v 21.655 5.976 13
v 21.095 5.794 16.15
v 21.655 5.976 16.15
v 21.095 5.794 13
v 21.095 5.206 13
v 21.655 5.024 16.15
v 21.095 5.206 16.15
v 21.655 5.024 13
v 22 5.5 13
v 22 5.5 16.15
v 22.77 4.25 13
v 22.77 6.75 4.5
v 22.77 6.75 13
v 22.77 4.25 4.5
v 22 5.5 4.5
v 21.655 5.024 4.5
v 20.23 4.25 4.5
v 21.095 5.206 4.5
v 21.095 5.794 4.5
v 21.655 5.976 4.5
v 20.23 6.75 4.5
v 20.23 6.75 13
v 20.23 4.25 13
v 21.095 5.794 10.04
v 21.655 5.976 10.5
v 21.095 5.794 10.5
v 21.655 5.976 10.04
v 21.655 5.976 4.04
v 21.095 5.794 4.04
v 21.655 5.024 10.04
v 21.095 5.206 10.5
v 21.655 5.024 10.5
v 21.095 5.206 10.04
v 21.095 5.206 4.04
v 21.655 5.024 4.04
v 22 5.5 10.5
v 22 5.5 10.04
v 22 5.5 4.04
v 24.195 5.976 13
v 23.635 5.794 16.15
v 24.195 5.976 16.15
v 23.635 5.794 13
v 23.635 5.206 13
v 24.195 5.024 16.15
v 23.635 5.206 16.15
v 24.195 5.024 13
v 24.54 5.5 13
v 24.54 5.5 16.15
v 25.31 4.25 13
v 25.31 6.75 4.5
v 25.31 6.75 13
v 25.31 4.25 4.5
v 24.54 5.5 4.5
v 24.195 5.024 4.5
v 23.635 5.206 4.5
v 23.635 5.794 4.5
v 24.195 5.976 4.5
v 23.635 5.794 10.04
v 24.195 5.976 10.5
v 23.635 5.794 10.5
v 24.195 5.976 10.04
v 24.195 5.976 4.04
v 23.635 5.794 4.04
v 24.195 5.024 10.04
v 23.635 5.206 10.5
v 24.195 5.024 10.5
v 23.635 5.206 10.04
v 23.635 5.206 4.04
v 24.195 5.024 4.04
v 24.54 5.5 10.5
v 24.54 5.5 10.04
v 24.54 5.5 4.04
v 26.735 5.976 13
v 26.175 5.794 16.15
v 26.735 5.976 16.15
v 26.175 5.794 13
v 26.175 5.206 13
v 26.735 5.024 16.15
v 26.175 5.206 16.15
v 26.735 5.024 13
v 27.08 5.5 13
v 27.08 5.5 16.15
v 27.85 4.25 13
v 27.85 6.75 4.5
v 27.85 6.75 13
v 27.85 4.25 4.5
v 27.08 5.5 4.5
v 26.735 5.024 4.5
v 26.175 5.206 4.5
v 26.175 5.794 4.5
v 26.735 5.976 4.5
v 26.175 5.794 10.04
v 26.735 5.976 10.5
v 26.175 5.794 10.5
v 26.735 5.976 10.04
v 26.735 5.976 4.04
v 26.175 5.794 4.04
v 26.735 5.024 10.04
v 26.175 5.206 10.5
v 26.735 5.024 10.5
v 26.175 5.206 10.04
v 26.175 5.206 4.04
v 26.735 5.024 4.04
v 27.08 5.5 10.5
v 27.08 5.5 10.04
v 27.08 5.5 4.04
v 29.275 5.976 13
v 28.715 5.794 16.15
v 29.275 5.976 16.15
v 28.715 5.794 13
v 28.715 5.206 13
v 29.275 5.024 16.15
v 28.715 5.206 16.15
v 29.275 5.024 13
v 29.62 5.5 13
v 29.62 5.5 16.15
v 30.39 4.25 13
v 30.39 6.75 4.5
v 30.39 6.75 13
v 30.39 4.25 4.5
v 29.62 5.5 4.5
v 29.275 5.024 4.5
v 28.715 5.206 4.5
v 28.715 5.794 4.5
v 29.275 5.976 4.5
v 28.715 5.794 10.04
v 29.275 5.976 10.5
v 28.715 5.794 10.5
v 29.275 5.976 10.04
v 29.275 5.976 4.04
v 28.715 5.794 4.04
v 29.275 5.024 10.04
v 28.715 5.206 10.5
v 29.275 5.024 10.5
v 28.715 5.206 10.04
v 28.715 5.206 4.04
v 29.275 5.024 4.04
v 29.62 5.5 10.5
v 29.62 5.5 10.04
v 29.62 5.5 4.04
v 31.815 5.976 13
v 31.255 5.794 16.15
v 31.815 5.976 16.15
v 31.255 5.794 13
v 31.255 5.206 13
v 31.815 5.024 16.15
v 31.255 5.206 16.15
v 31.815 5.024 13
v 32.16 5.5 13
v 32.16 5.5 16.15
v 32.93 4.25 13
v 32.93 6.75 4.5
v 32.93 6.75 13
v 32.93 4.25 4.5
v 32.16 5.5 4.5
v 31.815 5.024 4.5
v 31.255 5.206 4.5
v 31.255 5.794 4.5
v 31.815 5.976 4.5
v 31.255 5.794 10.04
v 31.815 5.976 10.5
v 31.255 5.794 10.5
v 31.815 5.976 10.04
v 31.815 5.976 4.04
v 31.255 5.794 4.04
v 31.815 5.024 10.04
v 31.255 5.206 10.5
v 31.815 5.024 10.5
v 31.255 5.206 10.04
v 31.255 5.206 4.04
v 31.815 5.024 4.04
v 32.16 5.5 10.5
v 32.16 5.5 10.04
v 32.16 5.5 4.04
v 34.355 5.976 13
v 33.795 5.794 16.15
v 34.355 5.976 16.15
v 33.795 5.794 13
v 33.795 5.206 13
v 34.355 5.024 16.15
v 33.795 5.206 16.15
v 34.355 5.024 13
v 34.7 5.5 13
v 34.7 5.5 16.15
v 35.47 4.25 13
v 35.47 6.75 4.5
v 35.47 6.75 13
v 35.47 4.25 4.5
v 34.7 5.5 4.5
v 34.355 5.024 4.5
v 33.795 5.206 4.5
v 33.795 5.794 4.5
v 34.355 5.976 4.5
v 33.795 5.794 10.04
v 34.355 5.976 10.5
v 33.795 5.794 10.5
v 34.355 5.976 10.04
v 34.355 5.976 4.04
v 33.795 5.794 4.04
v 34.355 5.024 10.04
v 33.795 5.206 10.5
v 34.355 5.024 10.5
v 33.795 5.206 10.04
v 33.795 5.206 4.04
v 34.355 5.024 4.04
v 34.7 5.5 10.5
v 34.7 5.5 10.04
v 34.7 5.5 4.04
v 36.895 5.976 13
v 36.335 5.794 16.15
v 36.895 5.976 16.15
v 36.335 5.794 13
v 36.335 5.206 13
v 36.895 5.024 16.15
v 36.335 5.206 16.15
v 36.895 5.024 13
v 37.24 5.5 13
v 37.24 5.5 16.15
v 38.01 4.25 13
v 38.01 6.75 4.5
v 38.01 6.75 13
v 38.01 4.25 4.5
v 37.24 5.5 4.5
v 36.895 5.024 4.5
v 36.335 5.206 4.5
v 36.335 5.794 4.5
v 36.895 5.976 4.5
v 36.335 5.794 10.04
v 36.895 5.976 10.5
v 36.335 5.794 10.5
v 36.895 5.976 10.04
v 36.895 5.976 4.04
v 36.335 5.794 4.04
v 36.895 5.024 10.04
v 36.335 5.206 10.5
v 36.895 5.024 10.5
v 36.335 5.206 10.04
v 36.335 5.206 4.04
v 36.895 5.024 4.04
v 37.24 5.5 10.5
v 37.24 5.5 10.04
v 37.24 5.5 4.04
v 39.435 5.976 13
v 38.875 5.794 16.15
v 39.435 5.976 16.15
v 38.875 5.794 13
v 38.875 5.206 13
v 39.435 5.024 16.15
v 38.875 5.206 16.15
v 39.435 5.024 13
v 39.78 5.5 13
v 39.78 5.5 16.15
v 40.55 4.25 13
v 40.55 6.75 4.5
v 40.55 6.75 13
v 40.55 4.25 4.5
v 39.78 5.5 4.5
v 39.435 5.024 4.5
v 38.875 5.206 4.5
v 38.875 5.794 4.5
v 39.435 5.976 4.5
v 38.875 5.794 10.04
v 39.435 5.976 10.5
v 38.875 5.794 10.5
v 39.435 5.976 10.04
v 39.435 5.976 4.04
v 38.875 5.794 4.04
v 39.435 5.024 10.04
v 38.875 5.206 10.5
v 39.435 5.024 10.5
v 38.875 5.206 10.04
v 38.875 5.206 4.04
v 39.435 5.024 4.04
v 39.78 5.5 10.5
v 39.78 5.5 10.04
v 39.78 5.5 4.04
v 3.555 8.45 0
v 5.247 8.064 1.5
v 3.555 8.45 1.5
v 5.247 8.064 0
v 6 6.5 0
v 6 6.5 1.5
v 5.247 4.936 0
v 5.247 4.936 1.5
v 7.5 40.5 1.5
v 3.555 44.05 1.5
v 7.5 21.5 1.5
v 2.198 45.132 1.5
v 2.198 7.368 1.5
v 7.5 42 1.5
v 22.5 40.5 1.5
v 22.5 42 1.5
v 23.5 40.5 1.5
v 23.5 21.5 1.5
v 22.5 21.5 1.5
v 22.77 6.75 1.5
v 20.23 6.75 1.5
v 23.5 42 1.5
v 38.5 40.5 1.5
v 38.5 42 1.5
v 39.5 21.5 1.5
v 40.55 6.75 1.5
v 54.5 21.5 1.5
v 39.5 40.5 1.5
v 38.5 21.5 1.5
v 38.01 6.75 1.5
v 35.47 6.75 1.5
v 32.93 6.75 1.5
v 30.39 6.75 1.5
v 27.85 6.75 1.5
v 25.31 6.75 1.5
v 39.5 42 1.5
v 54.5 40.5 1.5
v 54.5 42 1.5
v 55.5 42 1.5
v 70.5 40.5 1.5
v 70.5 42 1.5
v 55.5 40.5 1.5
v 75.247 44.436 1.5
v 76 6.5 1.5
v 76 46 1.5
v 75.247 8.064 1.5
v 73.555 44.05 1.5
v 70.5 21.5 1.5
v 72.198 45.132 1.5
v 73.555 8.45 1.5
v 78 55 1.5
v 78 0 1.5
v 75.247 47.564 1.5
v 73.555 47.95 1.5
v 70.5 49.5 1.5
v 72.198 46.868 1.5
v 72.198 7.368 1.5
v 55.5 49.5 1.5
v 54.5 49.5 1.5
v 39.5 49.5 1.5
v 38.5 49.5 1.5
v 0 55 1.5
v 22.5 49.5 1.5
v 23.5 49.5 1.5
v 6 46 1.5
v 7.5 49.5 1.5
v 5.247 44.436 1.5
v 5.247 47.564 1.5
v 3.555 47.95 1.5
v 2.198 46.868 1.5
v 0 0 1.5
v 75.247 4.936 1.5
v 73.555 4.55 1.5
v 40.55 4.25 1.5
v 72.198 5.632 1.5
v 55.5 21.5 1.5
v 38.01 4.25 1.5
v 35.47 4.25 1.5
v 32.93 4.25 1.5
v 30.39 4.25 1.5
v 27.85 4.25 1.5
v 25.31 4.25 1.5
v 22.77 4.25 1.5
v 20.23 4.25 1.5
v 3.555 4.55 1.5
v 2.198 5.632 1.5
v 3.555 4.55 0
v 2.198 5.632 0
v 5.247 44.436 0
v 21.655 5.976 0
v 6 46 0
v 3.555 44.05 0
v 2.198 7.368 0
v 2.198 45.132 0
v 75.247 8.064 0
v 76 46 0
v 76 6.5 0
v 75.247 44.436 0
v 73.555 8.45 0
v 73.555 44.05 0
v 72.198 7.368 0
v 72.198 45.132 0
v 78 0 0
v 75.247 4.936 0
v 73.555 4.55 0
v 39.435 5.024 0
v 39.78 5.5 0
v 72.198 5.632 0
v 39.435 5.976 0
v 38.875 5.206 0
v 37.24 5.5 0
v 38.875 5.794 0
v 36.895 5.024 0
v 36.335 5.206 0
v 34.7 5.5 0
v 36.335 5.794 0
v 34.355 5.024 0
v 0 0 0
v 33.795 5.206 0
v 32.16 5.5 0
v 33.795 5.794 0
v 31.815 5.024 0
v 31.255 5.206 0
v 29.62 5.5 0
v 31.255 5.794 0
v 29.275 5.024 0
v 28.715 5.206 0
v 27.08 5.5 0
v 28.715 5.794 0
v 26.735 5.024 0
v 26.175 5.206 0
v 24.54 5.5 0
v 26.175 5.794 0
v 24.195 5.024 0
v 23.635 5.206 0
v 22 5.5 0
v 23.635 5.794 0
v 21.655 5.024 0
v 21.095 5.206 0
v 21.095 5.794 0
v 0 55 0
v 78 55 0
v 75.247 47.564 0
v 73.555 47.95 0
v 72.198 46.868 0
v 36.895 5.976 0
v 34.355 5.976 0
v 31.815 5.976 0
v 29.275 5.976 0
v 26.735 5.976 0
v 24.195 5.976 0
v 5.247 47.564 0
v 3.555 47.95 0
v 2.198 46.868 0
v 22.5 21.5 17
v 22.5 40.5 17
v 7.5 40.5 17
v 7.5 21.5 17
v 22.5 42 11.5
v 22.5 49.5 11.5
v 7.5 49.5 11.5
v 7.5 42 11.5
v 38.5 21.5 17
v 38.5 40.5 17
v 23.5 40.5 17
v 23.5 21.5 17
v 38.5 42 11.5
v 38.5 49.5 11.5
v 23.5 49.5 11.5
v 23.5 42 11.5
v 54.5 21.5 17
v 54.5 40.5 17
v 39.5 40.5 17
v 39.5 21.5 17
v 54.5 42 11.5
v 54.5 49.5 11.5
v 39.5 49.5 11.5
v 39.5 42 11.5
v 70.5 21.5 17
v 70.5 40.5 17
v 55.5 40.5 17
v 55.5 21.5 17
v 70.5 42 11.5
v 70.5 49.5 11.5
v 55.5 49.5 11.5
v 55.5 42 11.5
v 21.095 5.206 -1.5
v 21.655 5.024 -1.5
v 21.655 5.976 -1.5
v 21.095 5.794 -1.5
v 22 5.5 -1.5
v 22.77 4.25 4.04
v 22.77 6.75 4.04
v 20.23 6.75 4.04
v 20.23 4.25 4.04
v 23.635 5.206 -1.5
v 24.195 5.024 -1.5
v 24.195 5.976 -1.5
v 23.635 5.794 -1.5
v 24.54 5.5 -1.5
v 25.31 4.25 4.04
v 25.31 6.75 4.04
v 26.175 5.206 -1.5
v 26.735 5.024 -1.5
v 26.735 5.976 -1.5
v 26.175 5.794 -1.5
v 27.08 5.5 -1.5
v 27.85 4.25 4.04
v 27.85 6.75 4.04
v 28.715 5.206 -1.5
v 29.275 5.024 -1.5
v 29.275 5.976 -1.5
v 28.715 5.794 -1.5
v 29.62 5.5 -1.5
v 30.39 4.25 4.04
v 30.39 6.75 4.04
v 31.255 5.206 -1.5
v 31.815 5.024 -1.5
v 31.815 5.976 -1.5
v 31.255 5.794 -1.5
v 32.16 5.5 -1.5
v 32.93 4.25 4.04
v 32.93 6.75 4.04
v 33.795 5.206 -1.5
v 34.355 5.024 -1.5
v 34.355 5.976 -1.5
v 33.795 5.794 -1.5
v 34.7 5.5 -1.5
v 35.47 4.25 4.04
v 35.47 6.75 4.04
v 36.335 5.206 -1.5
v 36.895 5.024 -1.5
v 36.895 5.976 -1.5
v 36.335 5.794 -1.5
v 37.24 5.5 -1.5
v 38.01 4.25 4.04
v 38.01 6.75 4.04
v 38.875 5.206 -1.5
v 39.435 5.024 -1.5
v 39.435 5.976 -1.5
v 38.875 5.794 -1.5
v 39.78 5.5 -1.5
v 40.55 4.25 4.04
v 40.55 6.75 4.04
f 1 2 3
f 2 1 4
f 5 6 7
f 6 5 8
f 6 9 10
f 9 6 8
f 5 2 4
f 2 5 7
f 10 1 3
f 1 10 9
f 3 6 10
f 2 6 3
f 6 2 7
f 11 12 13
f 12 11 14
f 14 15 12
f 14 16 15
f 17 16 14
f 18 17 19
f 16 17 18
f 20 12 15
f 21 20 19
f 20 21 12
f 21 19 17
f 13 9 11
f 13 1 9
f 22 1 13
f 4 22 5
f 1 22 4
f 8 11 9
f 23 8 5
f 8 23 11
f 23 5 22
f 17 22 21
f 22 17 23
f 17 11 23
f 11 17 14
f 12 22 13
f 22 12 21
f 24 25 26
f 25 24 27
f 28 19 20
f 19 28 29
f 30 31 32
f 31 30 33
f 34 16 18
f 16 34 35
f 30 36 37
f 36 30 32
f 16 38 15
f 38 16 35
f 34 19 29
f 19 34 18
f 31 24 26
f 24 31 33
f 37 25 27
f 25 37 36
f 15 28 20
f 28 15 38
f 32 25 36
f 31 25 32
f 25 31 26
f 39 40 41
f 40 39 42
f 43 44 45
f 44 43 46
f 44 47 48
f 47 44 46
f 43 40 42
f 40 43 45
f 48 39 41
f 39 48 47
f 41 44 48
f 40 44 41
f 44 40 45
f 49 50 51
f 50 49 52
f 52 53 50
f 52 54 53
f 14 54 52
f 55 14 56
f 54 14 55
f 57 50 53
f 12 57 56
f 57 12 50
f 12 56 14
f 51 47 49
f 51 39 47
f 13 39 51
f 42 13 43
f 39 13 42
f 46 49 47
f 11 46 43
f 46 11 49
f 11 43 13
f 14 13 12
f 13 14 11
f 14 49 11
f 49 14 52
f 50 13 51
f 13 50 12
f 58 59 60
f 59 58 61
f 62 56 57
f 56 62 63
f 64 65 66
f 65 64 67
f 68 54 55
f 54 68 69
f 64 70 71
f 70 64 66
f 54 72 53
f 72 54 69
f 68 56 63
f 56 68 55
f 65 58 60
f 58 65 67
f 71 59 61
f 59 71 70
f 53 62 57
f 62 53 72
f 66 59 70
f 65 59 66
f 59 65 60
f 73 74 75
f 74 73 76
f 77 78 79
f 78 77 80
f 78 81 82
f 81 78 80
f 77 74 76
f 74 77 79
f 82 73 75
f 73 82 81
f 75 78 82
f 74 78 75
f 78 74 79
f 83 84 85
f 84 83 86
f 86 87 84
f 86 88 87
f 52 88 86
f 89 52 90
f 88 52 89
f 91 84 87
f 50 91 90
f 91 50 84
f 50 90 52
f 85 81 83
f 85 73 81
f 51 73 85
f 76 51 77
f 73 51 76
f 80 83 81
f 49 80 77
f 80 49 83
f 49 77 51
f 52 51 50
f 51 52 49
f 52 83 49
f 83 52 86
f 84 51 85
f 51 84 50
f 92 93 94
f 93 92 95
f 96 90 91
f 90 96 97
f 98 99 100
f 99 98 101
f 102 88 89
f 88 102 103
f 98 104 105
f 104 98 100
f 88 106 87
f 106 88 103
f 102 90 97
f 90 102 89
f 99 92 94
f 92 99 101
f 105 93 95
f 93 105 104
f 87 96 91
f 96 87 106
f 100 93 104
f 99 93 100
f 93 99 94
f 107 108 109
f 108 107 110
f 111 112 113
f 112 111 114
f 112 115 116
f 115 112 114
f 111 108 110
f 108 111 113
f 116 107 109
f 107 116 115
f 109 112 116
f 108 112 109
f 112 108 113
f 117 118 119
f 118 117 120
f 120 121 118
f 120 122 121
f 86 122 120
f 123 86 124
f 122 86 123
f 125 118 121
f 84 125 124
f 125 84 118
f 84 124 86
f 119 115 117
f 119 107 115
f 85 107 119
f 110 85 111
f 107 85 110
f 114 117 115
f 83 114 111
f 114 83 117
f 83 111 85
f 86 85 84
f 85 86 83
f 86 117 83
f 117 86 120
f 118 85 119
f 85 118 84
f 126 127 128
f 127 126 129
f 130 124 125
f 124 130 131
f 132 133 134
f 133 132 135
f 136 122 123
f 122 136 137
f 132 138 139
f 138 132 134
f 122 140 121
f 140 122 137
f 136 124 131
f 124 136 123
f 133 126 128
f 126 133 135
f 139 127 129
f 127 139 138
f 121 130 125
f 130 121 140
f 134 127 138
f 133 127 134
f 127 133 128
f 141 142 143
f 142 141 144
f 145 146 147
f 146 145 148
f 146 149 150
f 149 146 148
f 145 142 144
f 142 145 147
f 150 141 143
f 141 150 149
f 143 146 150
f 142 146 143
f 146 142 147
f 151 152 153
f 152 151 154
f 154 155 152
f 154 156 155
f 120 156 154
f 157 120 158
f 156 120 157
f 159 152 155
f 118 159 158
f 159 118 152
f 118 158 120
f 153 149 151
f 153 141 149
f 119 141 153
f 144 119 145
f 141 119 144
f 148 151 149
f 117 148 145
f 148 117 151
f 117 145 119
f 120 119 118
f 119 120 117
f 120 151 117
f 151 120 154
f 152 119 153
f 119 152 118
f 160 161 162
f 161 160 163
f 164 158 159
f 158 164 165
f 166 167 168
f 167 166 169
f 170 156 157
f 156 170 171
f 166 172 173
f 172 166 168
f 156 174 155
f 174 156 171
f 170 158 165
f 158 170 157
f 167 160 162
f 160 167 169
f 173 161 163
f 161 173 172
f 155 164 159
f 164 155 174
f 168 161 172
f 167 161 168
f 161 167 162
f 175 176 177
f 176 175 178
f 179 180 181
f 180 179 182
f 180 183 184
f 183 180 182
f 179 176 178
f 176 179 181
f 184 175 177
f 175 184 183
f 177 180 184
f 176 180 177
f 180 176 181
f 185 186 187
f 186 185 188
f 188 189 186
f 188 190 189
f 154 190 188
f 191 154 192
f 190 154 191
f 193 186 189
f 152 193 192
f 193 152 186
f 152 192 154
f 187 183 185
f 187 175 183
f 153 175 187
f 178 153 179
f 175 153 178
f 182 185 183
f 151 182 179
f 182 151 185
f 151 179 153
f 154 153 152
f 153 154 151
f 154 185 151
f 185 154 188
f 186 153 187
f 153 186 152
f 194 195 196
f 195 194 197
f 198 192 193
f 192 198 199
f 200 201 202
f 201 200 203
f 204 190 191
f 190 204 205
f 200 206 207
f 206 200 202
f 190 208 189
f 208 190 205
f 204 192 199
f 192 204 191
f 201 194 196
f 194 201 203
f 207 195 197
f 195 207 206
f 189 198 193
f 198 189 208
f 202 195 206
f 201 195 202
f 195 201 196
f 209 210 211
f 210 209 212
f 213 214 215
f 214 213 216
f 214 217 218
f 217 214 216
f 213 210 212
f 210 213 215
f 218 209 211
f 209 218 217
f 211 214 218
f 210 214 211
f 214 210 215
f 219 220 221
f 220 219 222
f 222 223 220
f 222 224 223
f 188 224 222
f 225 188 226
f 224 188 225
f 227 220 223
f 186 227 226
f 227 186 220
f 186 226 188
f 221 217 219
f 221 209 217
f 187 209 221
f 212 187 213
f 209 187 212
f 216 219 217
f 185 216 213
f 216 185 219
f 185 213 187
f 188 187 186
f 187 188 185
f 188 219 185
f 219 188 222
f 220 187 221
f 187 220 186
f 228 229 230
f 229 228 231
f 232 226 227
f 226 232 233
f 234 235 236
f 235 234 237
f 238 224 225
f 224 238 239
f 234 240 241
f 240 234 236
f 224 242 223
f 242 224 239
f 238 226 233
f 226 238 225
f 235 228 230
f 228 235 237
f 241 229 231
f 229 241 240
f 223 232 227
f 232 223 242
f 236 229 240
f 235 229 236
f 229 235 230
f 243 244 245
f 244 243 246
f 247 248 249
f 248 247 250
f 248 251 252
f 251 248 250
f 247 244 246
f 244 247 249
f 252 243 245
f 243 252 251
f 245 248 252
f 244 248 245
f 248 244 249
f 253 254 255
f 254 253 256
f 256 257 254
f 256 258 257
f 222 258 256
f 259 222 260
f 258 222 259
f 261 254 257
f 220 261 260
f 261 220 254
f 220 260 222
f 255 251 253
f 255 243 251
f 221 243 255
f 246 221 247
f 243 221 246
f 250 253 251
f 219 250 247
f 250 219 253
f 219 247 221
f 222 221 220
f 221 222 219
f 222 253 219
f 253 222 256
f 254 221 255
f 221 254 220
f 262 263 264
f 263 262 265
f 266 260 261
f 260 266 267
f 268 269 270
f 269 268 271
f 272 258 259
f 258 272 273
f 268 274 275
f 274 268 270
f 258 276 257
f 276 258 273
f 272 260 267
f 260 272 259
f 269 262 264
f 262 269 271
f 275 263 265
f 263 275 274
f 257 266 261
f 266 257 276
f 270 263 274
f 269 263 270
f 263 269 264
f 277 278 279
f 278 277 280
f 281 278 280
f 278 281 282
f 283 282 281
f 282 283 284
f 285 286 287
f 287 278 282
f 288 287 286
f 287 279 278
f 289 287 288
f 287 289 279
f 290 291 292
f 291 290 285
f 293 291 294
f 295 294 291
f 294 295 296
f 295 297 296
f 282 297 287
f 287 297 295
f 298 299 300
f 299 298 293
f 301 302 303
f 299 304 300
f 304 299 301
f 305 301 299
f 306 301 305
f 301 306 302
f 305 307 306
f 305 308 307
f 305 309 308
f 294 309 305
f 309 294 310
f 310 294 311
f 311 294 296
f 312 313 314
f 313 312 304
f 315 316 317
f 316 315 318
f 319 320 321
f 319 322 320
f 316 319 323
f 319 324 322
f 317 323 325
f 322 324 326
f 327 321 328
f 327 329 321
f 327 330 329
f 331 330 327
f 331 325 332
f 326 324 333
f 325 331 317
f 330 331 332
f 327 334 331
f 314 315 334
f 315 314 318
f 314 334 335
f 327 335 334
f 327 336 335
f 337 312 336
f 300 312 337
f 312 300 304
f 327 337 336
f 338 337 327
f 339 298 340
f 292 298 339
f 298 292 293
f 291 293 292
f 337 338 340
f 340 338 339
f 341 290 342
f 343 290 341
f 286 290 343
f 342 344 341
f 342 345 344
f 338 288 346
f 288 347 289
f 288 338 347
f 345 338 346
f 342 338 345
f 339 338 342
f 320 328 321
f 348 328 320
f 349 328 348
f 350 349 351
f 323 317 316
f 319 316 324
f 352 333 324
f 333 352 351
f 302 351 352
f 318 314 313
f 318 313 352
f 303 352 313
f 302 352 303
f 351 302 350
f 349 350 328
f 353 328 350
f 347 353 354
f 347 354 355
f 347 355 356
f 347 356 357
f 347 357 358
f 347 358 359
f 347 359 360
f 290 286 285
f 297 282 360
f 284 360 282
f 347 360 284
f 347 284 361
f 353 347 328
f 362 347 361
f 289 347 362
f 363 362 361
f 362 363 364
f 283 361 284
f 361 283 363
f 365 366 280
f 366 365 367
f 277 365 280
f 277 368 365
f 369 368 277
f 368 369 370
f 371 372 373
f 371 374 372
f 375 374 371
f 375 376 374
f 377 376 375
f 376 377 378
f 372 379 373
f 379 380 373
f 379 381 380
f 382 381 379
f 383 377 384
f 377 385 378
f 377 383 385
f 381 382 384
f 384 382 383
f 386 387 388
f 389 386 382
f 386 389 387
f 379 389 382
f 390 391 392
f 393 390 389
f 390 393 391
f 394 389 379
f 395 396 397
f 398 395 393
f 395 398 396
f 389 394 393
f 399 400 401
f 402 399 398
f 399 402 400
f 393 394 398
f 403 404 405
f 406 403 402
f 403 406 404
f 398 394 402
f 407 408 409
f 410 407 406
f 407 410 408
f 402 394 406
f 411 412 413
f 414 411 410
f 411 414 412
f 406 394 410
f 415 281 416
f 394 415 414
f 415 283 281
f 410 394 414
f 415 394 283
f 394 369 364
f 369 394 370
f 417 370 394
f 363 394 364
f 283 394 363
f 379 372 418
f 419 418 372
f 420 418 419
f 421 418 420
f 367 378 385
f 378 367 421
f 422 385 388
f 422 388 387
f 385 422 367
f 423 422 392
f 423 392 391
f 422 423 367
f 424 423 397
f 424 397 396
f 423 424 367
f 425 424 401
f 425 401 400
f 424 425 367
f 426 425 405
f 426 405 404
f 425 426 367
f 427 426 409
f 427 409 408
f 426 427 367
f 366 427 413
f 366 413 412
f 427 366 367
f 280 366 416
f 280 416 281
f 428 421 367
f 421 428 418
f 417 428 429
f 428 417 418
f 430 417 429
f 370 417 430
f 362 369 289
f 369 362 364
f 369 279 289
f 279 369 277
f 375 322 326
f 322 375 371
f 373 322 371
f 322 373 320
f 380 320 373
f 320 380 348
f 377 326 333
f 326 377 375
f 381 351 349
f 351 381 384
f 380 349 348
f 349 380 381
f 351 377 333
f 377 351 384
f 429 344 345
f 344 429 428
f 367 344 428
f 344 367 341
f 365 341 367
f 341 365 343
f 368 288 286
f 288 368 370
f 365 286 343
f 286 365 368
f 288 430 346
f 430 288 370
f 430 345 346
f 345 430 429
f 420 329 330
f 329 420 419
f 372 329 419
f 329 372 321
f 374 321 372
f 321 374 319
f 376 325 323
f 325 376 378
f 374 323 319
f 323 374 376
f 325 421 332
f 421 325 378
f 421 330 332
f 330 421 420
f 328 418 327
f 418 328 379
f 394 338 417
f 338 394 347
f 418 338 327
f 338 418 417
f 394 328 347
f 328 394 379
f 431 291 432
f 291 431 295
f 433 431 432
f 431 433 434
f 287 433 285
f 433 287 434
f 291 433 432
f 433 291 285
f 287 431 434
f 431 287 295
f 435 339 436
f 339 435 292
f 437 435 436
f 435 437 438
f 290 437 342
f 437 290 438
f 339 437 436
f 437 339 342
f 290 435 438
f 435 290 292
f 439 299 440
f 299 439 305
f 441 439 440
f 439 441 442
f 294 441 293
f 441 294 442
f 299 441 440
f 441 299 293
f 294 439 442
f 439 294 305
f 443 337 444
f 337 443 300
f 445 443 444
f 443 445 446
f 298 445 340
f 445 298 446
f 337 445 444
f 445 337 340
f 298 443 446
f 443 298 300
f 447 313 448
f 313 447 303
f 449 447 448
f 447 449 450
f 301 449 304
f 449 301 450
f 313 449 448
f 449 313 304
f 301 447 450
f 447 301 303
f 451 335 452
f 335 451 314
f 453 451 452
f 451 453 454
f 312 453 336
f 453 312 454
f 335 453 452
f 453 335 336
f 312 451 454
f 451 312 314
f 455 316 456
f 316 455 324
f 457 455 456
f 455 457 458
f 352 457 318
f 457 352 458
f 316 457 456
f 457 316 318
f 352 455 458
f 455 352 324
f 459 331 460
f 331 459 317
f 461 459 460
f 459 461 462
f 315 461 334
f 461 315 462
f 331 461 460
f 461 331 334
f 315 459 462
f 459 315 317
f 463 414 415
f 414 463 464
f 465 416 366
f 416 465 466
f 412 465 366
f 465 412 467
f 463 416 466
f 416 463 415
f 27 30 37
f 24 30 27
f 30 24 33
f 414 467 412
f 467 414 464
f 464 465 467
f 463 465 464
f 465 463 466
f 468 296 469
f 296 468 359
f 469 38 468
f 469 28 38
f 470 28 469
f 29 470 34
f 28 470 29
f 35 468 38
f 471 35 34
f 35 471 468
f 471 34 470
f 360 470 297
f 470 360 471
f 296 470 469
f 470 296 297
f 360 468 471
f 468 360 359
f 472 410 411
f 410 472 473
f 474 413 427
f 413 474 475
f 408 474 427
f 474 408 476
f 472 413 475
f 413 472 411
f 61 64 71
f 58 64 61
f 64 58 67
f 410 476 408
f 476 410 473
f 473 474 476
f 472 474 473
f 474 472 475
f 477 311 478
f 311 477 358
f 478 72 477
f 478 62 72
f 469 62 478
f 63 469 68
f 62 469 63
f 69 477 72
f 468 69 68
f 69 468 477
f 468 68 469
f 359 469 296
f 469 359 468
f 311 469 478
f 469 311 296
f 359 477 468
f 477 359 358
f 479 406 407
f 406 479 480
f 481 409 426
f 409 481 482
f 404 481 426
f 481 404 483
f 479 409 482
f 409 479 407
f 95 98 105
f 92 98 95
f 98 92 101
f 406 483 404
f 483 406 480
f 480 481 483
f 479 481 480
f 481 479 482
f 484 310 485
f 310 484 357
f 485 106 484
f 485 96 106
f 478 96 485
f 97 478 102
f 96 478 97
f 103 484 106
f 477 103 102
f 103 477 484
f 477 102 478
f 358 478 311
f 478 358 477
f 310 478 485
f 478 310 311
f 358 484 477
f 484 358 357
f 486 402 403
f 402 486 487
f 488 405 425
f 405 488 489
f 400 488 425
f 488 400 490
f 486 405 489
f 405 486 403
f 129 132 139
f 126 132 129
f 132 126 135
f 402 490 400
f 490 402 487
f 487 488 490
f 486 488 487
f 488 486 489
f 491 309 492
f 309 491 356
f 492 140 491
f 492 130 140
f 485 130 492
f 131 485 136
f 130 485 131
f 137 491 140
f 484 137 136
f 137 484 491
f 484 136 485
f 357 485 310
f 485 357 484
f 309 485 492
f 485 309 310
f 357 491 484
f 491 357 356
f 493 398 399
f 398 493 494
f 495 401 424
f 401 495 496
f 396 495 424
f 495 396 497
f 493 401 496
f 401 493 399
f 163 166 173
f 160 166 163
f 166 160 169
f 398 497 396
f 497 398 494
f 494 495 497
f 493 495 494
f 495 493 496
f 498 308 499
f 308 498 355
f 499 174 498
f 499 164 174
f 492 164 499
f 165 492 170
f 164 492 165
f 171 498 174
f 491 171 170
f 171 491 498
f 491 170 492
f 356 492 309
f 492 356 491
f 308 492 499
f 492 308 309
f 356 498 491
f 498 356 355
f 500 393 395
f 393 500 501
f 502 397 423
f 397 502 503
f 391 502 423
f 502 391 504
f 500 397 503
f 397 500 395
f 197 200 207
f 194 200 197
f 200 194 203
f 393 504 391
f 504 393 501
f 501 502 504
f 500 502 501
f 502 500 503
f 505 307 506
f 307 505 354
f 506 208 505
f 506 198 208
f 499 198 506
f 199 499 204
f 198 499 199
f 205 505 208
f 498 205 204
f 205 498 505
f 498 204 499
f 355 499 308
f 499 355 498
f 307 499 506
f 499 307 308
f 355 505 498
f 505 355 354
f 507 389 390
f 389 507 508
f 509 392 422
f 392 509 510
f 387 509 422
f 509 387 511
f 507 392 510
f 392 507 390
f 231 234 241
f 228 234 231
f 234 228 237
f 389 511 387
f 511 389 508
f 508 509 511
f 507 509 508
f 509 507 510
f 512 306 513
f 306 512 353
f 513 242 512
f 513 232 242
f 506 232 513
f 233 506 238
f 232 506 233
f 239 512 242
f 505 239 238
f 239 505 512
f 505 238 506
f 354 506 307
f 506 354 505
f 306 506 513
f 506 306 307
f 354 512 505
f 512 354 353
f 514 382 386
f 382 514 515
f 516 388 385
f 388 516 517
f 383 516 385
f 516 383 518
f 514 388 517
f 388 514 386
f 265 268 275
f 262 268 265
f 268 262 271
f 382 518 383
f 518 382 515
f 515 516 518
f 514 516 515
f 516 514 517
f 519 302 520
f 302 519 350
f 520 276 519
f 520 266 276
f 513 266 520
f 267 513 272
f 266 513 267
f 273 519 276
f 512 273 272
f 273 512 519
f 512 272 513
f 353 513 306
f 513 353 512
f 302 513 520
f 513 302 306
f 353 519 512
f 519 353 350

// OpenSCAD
module relay() {
    color("blue")
        cube([15, 19, 15.5]);
}

module relayConnector() {
    color("blue")
        cube([15, 7.5, 10]);
}

module header(pins = 1, rows = 1) {

    // pin
    diameter = 1;
    heightAbove = 6;
    heightBelow = 3;
    spacing = 2.54;
    
    // base
    width = 2.5;
    height = 2.54;
    
    for(col = [0: pins - 1]) {
        for(row = [0:rows - 1]) {
            translate([col * spacing, row * spacing, 0]){
                color("silver")
                        translate([0, 0, -heightBelow])
                        cylinder(d = 1, h = heightBelow + height + heightAbove);
                
                translate([-spacing/2, -width/2, 0]) {
                    color("black")
                        cube([spacing, width, height]);
                    
                }
            }
        }
    }
}

module headerSocket(pins = 1, rows = 1) {

    // pin
    diameter = 1;
    heightAbove = 6;
    heightBelow = 3.15;
    spacing = 2.54;
    
    // base
    width = 2.5;
    height = 8.5;
    
    translate([0,0,-(height-heightAbove)]) {
        
        for(col = [0: pins - 1]) {
            for(row = [0:rows - 1]) {
                translate([col * spacing, row * spacing, 0]){
                    difference() {
                        union() {
                            color("silver")
                                    translate([0, 0, -heightBelow])
                                    cylinder(d = 1, h = heightBelow + (height-heightAbove));
                            
                            translate([-spacing/2, -width/2, 0]) {
                                color("black")
                                    cube([spacing, width, height]);
                                
                            }
                        }
                        translate([0,0,height-heightAbove])
                        cylinder(d=diameter, h = heightAbove);
                    }
                }
            }
        }
    }
}

module relayBoard() {
    // hole size - 4mm diameter
    // 9mm from top, 4mm from side, 6.5mm from bottom
    
    width = 78;
    height = 55;
    thickness = 1.5;
    
    union() {
        color("red")
        difference() {
            cube([width, height, 1.5]);
            
            translate([0, 6.5, 0]) {    // Offset bottom holes
                translate([4, 0, 0])
                    cylinder(d = 4, h = thickness);
            
                translate([width - 4, 0, 0])
                    cylinder(d = 4, h = 1.5);
            }
            
            translate([0, height - 9, 0]) { // Offset top holes
                translate([4, 0, 0])
                    cylinder(d = 4, h = 1.5);
            
                translate([width - 4, 0, 0])
                    cylinder(d = 4, h = 1.5);
            }
        }
        
        // Place things on top of the board
        translate([0,0, thickness]) {
        
            // Relays
            relayCount = 4;
            footprintWidth = 15;
            totalWidth = width - 2*7.5;
            space = (totalWidth - 4*footprintWidth) / 3;
            
            for(i = [0:relayCount - 1]) {        
                
                // Relays are 7.5 from sides, 21.5 from bottom
                translate([7.5 + i*(footprintWidth + space), 21.5, 0]) {
                    relay();
                }
                
                // Relays are 7.5 from sides, 5.5 from top
                translate([7.5 + i*(footprintWidth + space), height - 13, 0]) {
                    relayConnector();
                }
            }
            
            // Header Strip
            translate([21.5, 5.5, 0]) {
                header(8, 1);
            }
        }
    }
}


// Assembly

translate([21.5, 5.5, 10.5])
rotate([180,0,0])
headerSocket(8,1);

relayBoard();
